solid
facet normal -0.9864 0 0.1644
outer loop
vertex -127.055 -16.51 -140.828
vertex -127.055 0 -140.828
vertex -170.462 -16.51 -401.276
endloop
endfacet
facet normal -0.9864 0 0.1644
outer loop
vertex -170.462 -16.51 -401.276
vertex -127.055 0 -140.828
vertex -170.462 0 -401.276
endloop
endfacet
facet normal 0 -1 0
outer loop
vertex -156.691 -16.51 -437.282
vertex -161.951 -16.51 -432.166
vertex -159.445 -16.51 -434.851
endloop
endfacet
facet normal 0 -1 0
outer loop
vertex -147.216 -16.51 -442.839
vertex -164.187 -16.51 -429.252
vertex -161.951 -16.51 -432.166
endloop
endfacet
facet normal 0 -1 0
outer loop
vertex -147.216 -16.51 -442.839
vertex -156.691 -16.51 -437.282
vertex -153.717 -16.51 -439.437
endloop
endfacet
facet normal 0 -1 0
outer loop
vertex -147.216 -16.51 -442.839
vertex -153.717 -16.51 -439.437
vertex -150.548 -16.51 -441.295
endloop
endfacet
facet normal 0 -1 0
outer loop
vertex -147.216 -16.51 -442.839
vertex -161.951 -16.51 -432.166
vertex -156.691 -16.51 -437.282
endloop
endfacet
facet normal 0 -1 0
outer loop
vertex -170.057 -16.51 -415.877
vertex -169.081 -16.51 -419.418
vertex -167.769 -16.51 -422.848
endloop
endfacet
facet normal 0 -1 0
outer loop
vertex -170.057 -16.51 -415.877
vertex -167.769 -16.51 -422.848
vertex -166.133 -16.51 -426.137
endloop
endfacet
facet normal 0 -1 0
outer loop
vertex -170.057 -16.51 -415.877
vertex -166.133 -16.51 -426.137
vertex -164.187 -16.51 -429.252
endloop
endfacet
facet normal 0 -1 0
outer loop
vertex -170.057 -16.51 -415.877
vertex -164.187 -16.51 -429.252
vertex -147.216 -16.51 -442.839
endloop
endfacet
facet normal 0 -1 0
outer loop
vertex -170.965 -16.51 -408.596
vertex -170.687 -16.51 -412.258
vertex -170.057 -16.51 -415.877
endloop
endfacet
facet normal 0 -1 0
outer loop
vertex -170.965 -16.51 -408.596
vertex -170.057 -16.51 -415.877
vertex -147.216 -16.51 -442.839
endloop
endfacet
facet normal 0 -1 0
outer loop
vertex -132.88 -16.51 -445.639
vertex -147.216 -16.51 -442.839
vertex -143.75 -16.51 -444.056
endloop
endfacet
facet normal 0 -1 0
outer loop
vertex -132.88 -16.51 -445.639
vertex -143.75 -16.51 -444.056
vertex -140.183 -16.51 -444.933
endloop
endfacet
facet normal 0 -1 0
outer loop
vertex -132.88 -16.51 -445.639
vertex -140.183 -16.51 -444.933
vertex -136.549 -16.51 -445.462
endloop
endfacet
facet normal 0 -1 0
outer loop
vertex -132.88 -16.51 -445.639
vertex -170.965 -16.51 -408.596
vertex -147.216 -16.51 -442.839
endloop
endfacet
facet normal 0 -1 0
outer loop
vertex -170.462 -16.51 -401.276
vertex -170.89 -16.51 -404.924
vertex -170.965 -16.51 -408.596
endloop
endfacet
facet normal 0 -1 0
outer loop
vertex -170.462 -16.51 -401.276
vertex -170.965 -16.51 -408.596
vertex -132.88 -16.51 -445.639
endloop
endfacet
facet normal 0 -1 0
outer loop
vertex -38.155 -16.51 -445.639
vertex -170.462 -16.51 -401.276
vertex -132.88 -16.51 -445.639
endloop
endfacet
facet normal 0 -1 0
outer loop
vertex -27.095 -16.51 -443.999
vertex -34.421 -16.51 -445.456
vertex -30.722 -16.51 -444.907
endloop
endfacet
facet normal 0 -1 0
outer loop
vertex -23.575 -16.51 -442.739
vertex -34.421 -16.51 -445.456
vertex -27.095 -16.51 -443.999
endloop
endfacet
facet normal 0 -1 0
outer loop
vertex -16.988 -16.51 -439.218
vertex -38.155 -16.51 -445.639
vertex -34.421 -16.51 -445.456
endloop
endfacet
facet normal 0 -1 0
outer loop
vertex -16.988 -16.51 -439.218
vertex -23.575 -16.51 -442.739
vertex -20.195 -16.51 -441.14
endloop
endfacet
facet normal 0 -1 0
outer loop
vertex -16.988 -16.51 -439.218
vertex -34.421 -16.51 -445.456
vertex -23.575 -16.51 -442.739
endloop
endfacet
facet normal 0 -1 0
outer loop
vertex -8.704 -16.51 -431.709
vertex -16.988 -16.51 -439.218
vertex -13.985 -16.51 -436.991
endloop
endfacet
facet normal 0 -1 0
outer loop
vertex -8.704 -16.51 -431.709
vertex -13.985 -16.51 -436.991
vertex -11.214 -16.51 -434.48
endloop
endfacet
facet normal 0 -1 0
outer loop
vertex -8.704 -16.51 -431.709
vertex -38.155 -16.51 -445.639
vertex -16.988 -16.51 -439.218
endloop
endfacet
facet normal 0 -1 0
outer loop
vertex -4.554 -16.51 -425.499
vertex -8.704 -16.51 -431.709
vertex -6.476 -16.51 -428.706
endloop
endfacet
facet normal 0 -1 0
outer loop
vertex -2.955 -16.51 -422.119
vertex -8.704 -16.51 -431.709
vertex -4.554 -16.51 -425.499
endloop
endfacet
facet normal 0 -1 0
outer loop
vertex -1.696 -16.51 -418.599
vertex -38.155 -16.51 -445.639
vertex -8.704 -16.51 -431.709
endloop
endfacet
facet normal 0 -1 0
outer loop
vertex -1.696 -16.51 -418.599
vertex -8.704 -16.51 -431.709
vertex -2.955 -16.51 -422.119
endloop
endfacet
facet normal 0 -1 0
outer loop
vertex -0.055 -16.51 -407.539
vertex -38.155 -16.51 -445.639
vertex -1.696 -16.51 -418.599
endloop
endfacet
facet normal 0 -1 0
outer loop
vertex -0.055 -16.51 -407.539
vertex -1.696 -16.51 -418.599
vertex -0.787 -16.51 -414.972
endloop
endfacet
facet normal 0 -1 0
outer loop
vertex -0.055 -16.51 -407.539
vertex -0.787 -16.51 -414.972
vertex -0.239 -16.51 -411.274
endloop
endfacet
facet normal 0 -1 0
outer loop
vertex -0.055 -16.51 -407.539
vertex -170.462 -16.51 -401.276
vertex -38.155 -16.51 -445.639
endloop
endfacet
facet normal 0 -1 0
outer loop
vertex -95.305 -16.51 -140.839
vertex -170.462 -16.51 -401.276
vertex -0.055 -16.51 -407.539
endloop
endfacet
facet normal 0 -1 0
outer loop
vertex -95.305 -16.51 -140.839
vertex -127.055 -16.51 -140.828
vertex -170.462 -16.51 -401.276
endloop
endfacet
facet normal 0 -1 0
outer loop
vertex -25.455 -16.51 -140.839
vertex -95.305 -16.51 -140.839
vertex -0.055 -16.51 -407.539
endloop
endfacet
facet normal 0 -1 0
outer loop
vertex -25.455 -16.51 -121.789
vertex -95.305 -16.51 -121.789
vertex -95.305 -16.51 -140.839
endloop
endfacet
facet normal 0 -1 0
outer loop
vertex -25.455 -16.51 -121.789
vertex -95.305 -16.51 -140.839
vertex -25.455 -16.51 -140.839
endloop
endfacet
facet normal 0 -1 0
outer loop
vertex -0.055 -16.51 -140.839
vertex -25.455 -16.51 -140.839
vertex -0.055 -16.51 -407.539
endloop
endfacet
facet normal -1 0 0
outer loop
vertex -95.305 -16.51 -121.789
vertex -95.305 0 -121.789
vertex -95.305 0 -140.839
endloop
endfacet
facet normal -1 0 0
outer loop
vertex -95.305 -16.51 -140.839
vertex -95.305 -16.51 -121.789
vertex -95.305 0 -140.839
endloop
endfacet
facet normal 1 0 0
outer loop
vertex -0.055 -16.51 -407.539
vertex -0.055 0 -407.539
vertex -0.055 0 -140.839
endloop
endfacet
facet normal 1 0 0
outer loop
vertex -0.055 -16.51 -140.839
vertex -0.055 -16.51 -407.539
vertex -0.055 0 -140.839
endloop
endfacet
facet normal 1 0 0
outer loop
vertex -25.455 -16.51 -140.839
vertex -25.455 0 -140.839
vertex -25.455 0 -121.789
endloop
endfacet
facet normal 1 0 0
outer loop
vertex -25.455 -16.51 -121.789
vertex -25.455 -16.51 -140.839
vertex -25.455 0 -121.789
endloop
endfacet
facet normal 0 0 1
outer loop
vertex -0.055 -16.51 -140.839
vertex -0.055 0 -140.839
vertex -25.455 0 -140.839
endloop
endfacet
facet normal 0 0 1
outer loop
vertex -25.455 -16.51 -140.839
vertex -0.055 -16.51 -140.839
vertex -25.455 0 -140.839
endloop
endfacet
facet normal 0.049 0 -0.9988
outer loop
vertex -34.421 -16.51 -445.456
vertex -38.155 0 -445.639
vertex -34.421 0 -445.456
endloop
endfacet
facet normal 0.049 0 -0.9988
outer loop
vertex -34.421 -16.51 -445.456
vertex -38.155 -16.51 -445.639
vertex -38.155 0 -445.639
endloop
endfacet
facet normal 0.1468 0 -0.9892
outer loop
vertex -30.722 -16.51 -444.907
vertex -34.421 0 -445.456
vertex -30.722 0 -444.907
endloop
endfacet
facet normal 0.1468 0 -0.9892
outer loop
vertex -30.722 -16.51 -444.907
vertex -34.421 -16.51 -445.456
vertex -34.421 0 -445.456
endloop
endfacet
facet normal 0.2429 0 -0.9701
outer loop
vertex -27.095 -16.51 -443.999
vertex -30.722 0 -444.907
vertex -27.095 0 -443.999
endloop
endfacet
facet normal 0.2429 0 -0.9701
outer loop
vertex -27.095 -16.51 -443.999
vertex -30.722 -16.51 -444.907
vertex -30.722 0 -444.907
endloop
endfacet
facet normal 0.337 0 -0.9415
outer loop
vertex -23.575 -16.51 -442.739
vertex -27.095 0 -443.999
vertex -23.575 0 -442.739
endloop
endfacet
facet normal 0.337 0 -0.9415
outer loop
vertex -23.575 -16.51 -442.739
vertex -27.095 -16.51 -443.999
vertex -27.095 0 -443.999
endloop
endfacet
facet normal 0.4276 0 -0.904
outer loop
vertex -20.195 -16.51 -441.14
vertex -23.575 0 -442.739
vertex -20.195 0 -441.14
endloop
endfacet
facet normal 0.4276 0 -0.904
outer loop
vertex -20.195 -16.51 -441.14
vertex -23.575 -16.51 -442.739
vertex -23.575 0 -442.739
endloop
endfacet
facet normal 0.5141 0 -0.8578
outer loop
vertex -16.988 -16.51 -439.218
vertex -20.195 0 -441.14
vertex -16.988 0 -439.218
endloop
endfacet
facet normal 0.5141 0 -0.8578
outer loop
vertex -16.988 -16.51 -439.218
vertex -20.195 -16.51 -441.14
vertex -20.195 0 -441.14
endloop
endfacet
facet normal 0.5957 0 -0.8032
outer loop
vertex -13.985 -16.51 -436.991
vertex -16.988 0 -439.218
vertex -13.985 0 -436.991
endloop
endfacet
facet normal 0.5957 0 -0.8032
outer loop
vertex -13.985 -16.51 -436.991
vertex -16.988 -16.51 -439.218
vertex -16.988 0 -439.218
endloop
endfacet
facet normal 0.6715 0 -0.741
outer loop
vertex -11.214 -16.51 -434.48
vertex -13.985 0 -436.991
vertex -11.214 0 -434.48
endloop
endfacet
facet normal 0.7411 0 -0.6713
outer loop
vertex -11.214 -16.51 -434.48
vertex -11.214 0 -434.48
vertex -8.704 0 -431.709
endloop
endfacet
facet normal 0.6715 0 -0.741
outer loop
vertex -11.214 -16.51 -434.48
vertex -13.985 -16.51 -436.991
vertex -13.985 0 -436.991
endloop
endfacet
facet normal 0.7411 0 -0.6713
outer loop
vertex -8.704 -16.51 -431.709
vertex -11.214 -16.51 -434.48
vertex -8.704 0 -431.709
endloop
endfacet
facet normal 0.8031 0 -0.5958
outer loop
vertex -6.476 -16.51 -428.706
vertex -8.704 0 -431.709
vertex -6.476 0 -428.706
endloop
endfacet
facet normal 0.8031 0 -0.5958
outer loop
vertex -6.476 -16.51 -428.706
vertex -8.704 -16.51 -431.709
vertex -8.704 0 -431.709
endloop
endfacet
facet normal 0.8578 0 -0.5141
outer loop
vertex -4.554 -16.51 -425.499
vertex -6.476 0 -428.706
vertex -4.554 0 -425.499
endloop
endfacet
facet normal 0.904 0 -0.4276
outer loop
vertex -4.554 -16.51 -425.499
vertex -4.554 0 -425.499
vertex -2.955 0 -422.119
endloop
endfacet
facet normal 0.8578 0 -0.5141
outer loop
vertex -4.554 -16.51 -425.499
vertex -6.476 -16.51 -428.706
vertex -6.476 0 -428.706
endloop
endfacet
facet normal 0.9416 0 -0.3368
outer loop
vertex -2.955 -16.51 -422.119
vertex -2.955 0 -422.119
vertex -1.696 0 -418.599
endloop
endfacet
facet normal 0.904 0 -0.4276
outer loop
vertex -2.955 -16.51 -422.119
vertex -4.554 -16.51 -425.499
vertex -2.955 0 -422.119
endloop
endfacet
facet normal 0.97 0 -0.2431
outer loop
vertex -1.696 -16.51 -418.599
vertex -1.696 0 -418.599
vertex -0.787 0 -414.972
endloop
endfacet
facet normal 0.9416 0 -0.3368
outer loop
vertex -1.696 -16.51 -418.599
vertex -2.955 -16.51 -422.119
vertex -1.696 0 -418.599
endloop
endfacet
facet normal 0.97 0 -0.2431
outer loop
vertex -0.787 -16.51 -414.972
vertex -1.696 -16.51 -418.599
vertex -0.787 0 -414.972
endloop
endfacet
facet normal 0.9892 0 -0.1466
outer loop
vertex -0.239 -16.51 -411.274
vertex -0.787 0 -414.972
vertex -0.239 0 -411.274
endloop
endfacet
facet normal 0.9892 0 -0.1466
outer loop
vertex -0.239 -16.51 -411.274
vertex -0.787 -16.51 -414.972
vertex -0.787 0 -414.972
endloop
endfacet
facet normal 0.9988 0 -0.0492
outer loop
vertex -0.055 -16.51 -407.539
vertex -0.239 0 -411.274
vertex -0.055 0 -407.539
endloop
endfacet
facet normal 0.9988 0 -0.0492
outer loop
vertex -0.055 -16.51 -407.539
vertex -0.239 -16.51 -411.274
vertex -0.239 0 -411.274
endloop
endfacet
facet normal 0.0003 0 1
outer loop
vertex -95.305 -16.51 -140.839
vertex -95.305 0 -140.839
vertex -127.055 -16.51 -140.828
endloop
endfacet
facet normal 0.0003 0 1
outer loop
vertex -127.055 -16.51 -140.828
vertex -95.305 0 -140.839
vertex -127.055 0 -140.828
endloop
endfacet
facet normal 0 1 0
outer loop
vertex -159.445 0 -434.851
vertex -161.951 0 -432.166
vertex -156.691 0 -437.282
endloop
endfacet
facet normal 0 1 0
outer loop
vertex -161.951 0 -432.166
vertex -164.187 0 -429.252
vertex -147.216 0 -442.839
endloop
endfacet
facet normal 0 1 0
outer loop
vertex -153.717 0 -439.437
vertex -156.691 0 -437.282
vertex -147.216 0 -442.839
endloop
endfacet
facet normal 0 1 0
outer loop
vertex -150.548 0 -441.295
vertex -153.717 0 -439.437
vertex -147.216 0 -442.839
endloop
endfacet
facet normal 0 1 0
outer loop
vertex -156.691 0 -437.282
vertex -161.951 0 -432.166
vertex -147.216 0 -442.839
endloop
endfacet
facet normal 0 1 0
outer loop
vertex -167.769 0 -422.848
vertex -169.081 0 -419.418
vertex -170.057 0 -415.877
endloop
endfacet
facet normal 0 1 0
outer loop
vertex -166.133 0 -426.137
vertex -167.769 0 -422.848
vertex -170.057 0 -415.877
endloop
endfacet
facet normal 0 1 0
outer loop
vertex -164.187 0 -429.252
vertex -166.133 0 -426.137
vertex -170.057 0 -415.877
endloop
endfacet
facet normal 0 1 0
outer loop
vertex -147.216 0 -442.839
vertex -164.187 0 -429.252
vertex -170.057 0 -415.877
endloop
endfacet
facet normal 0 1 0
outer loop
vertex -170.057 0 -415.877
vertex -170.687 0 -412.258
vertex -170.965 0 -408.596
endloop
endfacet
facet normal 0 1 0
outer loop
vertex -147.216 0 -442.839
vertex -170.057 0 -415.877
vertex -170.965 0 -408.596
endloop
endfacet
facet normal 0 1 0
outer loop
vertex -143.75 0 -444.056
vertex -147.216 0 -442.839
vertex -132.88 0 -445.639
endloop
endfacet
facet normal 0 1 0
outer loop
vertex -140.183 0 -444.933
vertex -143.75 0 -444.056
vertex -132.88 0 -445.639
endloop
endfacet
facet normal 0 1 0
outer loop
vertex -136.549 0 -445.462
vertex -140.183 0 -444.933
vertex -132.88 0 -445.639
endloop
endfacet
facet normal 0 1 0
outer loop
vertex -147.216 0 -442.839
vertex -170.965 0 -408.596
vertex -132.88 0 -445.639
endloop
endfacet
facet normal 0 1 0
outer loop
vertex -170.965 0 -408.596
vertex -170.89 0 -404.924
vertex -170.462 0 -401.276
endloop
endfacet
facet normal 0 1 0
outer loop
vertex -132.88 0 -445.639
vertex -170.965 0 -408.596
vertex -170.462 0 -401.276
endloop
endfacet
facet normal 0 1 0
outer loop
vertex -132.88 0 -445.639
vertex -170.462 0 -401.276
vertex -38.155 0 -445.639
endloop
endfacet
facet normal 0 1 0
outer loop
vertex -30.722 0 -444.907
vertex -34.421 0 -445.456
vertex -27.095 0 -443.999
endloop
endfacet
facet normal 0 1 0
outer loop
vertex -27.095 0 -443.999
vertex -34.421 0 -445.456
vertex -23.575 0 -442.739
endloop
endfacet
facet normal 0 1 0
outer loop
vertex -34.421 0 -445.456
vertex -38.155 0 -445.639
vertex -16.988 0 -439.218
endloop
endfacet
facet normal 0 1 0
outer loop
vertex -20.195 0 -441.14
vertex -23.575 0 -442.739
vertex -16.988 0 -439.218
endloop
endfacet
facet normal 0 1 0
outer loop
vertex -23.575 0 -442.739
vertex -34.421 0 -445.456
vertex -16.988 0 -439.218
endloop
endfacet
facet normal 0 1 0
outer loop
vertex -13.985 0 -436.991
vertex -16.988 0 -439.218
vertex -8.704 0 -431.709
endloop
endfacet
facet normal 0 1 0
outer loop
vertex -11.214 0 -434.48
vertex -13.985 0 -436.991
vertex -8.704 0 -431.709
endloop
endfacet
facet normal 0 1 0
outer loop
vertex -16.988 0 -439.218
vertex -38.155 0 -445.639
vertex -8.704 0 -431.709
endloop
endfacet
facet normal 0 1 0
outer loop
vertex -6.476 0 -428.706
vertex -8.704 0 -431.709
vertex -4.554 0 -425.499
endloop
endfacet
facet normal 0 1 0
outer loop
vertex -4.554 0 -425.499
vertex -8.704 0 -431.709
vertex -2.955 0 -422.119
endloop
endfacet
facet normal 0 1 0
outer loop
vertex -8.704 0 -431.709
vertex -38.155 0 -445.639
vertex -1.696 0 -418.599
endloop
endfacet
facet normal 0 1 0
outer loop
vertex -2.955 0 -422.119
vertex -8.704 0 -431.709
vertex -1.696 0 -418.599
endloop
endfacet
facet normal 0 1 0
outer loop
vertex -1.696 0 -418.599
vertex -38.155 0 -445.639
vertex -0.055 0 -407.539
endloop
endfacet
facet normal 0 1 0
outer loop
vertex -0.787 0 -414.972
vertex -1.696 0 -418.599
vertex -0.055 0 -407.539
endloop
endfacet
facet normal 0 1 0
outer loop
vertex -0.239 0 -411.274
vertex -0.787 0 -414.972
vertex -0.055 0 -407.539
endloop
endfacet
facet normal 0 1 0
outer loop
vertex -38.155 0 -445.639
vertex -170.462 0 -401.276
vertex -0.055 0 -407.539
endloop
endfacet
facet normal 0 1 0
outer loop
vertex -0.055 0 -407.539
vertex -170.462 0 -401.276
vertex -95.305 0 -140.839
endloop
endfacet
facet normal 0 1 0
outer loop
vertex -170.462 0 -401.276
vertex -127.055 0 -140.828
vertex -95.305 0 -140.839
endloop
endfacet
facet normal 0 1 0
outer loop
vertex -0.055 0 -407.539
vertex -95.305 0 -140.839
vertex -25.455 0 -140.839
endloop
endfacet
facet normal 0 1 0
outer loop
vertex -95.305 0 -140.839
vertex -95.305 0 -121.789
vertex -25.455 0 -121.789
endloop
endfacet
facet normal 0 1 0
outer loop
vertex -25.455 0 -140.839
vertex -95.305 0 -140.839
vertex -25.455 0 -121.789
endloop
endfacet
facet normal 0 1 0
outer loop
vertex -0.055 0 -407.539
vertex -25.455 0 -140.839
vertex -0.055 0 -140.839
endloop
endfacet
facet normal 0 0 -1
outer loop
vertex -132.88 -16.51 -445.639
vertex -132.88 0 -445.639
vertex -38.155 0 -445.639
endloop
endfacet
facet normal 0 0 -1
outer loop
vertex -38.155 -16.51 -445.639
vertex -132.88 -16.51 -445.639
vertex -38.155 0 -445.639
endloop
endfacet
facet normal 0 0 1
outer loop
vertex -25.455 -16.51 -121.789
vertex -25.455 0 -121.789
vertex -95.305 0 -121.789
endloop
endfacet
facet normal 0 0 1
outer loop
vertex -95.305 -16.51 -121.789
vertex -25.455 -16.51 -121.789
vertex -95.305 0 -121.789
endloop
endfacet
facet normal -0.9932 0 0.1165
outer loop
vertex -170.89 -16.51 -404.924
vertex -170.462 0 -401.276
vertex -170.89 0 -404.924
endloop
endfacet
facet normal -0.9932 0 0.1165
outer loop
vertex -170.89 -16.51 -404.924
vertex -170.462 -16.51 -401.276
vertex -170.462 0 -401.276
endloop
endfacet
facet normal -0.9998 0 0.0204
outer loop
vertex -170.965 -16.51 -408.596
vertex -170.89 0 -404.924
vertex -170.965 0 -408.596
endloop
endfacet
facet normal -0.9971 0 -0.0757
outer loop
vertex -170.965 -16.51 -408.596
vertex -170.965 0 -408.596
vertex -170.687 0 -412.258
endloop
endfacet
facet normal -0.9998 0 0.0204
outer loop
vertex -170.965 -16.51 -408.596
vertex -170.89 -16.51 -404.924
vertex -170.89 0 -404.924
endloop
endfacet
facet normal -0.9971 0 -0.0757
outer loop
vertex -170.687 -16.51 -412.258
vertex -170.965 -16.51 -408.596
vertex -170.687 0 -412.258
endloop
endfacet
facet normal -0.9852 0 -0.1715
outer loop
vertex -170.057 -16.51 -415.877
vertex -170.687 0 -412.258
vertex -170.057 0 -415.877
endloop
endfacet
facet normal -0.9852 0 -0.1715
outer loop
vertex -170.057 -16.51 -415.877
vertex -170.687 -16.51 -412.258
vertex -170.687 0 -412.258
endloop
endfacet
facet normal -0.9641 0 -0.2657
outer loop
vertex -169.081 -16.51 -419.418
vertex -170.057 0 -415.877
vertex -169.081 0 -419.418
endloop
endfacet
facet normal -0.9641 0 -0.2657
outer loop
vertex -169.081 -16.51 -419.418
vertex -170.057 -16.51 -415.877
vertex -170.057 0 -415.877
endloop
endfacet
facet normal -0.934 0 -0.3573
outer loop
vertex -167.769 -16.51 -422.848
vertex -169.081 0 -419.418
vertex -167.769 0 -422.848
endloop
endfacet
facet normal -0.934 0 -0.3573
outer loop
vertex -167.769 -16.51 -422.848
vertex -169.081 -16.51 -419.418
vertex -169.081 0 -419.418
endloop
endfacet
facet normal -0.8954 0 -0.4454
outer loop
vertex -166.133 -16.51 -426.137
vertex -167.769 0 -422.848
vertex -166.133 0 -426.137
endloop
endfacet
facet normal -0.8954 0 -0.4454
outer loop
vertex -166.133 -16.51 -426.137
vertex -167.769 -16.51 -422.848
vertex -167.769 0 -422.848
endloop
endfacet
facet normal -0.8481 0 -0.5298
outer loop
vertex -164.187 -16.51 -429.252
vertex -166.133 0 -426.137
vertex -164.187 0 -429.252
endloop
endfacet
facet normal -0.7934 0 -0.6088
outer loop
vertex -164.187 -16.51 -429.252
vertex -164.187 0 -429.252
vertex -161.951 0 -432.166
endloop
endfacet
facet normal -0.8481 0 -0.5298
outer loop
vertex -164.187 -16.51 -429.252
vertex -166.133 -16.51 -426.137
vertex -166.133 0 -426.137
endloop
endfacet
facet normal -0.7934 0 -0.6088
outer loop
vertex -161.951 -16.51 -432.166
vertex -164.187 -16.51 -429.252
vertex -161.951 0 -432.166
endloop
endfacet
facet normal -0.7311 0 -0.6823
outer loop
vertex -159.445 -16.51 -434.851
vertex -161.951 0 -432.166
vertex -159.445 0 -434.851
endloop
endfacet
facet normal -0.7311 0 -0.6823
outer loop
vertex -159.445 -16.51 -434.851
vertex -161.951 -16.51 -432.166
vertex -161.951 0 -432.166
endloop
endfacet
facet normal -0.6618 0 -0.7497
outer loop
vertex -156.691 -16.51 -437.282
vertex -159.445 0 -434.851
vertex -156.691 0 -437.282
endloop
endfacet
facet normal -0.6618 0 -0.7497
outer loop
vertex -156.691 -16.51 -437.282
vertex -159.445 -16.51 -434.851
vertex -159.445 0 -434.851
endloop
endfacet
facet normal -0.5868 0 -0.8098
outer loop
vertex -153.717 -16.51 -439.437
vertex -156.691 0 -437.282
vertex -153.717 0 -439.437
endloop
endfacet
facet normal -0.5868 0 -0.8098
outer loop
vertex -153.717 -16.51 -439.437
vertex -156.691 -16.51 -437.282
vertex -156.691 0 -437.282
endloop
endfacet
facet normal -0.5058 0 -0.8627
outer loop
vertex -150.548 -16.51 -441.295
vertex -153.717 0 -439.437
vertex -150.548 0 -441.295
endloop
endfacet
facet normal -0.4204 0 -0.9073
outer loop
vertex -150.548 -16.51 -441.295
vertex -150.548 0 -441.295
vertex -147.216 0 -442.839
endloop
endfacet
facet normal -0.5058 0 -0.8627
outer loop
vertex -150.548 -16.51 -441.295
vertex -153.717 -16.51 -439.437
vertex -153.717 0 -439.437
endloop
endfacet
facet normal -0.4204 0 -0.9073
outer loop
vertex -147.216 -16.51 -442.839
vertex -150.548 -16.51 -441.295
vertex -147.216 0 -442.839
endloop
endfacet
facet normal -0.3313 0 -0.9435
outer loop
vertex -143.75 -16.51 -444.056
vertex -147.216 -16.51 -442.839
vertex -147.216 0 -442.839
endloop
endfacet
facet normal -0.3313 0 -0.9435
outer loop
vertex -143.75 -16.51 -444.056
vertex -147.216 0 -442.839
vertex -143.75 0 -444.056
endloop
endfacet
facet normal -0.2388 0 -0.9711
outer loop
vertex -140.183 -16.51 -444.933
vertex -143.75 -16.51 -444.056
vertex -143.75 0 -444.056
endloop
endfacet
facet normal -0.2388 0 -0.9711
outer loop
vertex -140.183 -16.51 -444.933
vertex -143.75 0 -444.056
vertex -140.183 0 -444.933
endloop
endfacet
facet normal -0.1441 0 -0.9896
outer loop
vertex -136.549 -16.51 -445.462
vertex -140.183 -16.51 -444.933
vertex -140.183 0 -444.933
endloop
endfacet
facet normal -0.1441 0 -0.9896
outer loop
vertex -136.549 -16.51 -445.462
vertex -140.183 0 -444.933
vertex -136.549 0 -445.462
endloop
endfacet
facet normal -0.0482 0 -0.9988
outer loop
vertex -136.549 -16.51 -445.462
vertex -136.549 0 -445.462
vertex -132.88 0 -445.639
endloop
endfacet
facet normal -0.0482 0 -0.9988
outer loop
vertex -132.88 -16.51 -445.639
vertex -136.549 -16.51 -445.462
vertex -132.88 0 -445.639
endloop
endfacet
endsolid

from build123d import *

# Parameters (mm, degrees)
F1_DEPTH = 16.51
F2_R     = 38.1
F3_R     = 38.1


with BuildPart() as f1:
    # F0 (on Front) → F1 (new body)
    with BuildSketch(Plane.XZ):
        Polygon((-0.055255, -445.639101), (-0.055255, -140.839101), (-25.455255, -140.839101), (-25.455255, -121.789101), (-95.305255, -121.789101), (-95.305255, -140.839101), (-127.055255, -140.827884), (-177.855255, -445.639101), align=None)
    extrude(amount=F1_DEPTH)

    # F2
    f2_edges = [f1.edges().sort_by_distance(p)[0] for p in [
        (-177.855255, -8.255, -445.639101),
    ]]
    fillet(f2_edges, radius=F2_R)

    # F3
    f3_edges = [f1.edges().sort_by_distance(p)[0] for p in [
        (-0.055255, -8.255, -445.639101),
    ]]
    fillet(f3_edges, radius=F3_R)


solid = f1.part
